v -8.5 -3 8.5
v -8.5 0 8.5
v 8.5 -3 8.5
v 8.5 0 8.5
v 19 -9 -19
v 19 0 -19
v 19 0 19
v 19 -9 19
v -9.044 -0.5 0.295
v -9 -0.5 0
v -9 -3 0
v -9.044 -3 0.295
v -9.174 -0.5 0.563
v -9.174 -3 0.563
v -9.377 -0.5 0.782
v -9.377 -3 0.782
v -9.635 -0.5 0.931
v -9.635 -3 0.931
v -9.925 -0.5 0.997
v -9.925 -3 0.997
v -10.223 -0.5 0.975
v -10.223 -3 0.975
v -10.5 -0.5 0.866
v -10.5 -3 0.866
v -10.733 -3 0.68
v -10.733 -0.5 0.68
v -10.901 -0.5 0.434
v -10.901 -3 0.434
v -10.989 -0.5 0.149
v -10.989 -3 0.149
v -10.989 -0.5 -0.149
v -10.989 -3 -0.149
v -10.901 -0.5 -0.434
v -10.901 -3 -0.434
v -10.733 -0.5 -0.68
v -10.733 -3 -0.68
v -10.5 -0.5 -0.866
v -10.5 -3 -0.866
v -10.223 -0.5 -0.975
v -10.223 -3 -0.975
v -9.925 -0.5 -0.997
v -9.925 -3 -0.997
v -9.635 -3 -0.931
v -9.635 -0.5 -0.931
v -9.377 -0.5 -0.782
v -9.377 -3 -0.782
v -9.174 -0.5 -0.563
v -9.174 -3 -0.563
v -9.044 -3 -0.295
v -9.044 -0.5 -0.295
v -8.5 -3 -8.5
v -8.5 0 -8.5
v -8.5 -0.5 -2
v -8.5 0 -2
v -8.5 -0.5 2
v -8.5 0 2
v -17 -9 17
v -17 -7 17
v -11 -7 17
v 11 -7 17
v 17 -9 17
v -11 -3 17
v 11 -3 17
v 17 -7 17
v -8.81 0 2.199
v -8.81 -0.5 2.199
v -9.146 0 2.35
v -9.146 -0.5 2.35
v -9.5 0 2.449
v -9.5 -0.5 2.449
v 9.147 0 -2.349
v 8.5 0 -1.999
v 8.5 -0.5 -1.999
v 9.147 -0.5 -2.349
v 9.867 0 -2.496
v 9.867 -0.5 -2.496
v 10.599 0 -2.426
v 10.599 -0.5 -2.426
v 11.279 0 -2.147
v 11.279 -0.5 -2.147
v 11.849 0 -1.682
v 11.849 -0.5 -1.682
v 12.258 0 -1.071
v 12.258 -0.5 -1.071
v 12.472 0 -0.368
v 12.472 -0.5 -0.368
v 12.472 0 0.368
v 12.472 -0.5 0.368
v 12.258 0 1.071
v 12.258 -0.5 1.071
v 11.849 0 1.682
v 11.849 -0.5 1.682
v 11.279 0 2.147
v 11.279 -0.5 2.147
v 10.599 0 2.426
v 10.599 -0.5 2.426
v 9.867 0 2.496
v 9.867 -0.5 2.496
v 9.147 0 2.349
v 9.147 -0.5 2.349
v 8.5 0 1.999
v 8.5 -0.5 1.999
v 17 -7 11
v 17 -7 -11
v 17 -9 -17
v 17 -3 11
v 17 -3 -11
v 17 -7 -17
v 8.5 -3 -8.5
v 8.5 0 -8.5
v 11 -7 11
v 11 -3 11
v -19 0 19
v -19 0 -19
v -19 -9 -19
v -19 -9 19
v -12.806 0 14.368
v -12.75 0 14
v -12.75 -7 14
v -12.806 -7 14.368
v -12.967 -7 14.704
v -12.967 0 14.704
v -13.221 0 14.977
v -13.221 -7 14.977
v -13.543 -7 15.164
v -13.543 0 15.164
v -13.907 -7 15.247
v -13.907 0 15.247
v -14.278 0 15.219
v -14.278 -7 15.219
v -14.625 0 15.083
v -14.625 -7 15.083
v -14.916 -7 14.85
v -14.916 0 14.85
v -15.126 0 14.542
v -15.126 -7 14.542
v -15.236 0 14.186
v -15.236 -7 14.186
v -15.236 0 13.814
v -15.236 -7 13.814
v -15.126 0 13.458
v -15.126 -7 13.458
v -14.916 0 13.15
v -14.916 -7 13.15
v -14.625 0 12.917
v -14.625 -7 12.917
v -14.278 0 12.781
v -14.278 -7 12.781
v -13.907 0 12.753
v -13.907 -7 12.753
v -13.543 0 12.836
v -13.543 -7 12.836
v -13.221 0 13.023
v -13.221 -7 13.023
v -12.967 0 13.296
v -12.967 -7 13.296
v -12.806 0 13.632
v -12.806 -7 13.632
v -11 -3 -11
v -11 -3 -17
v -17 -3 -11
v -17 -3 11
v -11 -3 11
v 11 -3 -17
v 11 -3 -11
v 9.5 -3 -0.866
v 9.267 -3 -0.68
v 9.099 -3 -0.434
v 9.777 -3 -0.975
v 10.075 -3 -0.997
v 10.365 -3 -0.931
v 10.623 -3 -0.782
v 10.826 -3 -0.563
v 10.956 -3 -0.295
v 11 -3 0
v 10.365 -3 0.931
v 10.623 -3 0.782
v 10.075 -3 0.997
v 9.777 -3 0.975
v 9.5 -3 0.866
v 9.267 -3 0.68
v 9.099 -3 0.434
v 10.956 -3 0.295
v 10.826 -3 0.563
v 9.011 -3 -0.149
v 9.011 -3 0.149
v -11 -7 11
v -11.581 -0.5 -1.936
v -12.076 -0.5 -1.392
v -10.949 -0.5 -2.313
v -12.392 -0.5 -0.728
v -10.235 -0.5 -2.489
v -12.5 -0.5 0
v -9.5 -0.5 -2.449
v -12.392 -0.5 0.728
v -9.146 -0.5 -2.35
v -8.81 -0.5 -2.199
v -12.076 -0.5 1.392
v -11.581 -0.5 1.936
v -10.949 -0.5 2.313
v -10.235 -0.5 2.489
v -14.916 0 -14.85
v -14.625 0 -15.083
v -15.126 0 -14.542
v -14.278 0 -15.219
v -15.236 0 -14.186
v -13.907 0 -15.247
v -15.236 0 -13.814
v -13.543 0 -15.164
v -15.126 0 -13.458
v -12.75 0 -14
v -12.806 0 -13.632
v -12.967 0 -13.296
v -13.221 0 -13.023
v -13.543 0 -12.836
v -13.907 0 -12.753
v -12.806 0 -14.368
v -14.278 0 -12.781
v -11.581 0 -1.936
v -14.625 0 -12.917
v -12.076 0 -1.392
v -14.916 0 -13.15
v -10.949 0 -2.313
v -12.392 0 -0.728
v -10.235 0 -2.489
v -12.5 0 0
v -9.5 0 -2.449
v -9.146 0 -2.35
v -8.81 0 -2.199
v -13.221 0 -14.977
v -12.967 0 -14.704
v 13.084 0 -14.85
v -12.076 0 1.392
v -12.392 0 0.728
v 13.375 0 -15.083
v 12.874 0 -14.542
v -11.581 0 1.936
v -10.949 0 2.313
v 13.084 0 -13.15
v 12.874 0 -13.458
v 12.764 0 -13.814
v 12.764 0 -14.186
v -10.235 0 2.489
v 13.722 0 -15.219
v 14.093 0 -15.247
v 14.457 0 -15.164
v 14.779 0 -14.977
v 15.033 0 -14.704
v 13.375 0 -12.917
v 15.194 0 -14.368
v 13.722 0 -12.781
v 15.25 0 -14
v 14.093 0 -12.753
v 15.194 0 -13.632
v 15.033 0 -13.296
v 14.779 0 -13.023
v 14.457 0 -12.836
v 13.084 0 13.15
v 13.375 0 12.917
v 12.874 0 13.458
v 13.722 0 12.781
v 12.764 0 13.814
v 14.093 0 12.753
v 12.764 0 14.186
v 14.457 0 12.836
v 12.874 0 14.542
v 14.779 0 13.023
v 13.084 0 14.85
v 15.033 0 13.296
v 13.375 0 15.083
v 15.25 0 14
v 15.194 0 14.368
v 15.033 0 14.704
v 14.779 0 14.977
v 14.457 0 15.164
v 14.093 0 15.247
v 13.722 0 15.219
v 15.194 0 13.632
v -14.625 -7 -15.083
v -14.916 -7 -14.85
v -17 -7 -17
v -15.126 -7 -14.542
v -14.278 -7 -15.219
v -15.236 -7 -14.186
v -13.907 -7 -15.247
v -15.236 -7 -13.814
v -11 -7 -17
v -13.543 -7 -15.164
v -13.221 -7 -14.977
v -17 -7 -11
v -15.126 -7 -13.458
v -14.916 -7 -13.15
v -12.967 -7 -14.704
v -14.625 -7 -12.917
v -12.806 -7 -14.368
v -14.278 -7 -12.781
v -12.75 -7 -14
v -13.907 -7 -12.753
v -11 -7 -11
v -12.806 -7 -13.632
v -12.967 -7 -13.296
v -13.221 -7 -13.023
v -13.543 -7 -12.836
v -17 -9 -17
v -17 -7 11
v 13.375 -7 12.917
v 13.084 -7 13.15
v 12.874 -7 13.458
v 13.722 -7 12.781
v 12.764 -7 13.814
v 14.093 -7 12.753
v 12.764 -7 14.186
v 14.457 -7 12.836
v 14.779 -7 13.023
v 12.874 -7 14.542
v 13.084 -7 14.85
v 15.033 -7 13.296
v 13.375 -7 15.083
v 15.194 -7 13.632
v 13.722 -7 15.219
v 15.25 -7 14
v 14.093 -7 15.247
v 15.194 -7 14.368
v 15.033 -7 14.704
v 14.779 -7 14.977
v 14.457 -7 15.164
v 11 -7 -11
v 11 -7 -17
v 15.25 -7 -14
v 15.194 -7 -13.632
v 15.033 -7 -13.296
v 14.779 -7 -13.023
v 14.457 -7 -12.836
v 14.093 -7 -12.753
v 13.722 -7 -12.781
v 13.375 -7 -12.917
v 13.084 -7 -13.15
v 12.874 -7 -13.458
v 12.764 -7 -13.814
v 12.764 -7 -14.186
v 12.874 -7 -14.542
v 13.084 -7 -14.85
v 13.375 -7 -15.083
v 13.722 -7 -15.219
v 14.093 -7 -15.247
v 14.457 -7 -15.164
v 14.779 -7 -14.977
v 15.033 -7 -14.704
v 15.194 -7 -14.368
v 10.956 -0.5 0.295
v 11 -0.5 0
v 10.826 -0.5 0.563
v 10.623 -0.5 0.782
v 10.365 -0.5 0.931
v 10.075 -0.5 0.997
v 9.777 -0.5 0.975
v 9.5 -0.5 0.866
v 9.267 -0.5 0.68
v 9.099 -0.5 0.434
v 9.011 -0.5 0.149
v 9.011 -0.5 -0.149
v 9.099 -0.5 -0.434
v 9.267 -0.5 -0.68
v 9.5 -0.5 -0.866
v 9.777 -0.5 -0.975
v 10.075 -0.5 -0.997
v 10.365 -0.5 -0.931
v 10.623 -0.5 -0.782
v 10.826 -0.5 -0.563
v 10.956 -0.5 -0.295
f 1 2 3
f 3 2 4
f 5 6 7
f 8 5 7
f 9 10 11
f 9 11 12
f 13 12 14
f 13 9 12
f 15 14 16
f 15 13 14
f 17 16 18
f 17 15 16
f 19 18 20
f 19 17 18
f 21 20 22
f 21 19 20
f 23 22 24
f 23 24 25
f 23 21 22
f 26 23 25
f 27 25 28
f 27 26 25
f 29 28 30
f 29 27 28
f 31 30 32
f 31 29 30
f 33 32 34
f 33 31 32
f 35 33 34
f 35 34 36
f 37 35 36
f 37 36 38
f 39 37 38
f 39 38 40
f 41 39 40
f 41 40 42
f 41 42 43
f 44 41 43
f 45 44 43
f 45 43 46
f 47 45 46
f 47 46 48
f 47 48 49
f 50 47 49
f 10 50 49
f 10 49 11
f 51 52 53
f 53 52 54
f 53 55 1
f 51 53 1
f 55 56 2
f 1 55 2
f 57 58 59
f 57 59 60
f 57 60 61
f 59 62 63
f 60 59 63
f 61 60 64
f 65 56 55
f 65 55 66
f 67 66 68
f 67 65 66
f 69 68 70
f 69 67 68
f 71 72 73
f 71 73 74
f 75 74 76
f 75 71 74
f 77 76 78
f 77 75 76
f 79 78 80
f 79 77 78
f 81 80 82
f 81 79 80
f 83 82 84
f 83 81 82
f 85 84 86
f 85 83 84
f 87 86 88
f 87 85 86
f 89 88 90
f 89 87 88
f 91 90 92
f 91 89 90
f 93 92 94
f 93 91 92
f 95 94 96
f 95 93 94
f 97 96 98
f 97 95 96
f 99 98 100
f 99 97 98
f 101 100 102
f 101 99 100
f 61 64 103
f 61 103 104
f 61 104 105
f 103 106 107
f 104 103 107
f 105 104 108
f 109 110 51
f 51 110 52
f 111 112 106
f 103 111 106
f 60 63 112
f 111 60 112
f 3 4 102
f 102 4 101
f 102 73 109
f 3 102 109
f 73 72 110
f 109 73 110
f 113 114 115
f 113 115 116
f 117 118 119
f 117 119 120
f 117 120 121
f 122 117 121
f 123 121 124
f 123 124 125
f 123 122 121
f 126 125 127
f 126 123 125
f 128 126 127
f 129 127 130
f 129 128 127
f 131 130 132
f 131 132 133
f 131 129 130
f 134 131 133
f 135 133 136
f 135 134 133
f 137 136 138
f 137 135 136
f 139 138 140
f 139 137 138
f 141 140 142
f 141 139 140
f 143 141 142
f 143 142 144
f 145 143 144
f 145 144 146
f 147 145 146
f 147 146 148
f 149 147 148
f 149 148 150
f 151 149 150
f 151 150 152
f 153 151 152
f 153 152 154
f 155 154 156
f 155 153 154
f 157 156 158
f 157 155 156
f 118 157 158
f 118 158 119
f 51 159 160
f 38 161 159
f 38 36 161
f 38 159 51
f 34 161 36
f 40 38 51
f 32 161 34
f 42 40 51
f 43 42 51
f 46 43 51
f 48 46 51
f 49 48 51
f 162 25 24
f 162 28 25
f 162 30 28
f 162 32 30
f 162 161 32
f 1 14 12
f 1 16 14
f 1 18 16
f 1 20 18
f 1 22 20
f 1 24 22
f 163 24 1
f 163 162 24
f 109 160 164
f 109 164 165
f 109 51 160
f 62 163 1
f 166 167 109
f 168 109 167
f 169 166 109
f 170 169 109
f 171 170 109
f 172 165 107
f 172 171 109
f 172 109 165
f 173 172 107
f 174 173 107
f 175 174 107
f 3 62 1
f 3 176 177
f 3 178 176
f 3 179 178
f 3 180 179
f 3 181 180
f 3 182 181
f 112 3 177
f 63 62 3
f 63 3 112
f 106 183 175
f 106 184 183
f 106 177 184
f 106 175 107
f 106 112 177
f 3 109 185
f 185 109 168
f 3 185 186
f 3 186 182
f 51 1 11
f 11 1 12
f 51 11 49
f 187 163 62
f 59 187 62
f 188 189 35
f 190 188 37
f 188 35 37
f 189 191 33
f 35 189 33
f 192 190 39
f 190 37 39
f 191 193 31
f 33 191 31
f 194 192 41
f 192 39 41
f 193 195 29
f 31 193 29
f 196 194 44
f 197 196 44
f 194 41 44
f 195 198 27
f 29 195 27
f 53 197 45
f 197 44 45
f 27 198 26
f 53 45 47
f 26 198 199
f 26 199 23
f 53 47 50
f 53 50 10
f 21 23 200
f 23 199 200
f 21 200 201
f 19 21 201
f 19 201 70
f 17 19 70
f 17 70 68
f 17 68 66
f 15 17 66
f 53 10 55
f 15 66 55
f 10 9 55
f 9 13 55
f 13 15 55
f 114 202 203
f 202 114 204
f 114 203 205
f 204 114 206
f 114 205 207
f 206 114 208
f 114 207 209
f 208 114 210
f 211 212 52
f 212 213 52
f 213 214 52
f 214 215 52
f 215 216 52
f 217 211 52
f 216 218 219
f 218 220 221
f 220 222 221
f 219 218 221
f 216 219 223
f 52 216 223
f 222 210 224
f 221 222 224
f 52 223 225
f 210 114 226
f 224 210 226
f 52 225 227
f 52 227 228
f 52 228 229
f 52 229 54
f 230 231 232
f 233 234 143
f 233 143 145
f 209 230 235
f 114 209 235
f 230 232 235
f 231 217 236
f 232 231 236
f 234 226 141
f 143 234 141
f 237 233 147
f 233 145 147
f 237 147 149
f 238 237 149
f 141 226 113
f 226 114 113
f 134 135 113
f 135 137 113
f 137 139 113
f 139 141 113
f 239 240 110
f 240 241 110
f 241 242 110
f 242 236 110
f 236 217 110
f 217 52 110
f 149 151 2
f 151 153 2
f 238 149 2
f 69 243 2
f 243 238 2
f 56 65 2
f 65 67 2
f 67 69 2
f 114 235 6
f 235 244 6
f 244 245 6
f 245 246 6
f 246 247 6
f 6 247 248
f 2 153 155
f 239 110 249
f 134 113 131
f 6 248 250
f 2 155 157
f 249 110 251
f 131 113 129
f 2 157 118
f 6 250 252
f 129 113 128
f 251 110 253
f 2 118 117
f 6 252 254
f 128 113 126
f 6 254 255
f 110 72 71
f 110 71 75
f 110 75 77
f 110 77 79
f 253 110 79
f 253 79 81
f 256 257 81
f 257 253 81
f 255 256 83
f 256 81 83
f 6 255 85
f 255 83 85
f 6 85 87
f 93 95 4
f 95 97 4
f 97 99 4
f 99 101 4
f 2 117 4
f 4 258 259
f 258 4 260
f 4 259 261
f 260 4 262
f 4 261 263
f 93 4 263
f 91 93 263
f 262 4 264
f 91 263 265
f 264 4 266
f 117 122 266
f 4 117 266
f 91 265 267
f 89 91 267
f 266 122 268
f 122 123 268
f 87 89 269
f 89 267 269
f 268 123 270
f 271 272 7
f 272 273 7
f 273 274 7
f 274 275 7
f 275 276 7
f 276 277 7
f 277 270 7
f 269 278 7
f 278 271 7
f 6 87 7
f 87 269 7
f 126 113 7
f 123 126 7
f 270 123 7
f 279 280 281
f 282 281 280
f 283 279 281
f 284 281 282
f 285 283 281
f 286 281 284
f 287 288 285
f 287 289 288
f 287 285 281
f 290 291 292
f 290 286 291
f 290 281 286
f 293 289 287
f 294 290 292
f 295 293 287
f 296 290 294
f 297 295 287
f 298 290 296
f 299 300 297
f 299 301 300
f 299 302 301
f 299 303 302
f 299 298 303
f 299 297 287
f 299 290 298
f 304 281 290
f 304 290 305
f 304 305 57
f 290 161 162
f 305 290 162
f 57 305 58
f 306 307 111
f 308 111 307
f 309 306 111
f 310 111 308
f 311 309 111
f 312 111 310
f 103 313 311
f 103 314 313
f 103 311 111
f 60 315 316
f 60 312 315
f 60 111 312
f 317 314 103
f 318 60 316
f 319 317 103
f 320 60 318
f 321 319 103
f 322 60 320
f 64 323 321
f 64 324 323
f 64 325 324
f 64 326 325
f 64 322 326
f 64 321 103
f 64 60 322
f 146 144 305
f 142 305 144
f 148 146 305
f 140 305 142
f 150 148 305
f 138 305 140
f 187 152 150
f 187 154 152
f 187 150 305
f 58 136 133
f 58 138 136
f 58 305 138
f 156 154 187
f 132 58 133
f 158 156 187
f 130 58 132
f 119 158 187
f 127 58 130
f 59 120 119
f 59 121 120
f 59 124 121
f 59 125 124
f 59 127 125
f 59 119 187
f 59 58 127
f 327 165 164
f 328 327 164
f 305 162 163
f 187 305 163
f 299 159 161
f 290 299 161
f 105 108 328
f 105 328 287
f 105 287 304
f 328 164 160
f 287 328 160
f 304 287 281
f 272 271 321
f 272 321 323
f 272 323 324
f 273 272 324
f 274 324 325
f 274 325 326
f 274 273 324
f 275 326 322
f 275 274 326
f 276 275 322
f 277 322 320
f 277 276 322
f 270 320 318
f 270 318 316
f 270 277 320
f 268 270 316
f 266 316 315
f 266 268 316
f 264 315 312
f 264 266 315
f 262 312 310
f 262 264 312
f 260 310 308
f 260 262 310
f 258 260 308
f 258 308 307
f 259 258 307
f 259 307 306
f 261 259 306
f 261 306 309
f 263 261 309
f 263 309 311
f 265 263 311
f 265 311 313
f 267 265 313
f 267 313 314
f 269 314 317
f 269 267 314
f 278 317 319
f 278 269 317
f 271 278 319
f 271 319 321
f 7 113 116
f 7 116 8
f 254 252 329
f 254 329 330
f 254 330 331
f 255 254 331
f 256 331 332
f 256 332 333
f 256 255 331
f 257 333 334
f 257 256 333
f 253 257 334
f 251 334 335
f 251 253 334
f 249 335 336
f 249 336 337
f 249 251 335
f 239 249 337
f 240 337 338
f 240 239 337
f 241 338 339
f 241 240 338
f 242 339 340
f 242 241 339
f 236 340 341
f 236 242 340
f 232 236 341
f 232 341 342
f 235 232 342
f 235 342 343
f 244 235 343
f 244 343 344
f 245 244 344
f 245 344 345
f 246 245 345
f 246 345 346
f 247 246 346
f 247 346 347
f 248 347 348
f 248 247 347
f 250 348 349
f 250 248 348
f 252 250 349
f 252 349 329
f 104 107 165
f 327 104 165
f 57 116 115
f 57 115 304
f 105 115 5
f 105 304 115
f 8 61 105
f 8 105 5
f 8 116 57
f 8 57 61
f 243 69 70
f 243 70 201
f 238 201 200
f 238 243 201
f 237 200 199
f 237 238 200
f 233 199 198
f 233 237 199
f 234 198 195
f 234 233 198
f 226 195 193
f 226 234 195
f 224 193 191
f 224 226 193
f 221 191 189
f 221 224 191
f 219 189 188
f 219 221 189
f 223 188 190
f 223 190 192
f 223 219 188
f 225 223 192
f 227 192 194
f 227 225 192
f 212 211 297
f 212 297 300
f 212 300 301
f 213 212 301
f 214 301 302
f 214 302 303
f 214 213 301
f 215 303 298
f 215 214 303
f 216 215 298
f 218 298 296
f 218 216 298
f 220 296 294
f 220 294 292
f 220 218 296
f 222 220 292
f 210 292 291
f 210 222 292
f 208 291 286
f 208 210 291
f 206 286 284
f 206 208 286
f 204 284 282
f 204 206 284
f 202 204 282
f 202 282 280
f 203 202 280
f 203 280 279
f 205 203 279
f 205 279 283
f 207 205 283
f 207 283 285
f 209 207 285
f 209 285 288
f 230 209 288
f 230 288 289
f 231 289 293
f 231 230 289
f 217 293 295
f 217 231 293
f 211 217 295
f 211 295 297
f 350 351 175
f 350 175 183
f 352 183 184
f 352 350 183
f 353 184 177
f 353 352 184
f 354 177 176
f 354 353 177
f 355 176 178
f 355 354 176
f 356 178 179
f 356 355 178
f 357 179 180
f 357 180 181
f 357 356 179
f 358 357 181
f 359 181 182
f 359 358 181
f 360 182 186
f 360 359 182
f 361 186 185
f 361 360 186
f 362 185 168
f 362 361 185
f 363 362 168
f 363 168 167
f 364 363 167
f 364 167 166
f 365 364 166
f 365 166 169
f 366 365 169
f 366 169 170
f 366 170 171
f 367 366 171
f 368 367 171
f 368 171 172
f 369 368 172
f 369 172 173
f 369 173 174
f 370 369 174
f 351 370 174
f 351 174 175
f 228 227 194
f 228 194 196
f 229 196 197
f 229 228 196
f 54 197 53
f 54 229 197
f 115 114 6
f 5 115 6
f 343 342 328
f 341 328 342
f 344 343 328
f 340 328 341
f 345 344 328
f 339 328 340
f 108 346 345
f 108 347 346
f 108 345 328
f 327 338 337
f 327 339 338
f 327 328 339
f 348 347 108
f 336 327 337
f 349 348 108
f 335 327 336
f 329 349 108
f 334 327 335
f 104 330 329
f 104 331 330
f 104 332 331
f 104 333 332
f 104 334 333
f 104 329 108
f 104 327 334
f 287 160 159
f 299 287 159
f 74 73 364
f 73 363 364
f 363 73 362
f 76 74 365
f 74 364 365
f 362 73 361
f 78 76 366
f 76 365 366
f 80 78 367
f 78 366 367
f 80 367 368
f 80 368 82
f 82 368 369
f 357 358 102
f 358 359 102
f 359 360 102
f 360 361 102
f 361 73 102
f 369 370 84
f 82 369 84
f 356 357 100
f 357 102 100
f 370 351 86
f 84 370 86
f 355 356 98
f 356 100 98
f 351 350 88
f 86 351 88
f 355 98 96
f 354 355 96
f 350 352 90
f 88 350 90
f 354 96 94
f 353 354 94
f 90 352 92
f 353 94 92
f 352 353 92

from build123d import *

# Parameters (mm, degrees)
F0_R     = 1.25
F1_DEPTH = 7
F0_R_2   = 1
F2_DEPTH = 3
F3_DEPTH = 3
F4_DEPTH = 7
F0_W     = 6
F0_H     = 6
F0_W_2   = 22
F0_H_2   = 1
F5_DEPTH = 3
F0_W_3   = 38
F0_H_3   = 38
F6_DEPTH = 9
F7_DEPTH = 0.5
F8_DEPTH = 0.5


with BuildPart() as f1:
    # F0 (on Front) → F1 (new body)
    with BuildSketch(Plane.XZ):
        with BuildLine():
            ThreePointArc((-11.5, 14), (-11.7639320225, 15.1180339887), (-12.5, 16))
            ThreePointArc((-12.5, 16), (-15.767766953, 15.767766953), (-16, 12.5))
            ThreePointArc((-16, 12.5), (-13.209430585, 11.6282917549), (-11.5, 14))
        make_face()
        with Locations((-14, 14)):
            Circle(F0_R, mode=Mode.SUBTRACT)
    extrude(amount=F1_DEPTH)

    # F0 (on Front) → F4 (join)
    with BuildSketch(Plane.XZ):
        with BuildLine():
            Line((-11, 11), (-11, 16))
            Line((-11, 16), (-12.5, 16))
            ThreePointArc((-12.5, 16), (-11.7639320225, 15.1180339887), (-11.5, 14))
            ThreePointArc((-11.5, 14), (-13.209430585, 11.6282917549), (-16, 12.5))
            Line((-16, 12.5), (-16, 11))
            Line((-16, 11), (-11, 11))
        make_face()
        with BuildLine():
            Line((-11, 16), (-11, 17))
            Line((-11, 17), (-17, 17))
            Line((-17, 17), (-17, 11))
            Line((-17, 11), (-16, 11))
            Line((-16, 11), (-16, 12.5))
            ThreePointArc((-16, 12.5), (-15.767766953, 15.767766953), (-12.5, 16))
            Line((-12.5, 16), (-11, 16))
        make_face()
    extrude(amount=F4_DEPTH)



with BuildPart() as f1b:
    # F0 (on Front) → F1, piece 2 (new body)
    with BuildSketch(Plane.XZ):
        with BuildLine():
            ThreePointArc((12.5, 16), (12.232233047, 12.232233047), (16, 12.5))
            ThreePointArc((16, 12.5), (16.3717082451, 13.209430585), (16.5, 14))
            ThreePointArc((16.5, 14), (15.1180339887, 16.2360679775), (12.5, 16))
        make_face()
        with Locations((14, 14)):
            Circle(F0_R, mode=Mode.SUBTRACT)
    extrude(amount=F1_DEPTH)

    # F0 (on Front) → F4, piece 2 (join)
    with BuildSketch(Plane.XZ):
        with BuildLine():
            ThreePointArc((16.5, 14), (16.3717082451, 13.209430585), (16, 12.5))
            Line((16, 12.5), (16, 11))
            Line((16, 11), (17, 11))
            Line((17, 11), (17, 17))
            Line((17, 17), (11, 17))
            Line((11, 17), (11, 16))
            Line((11, 16), (12.5, 16))
            ThreePointArc((12.5, 16), (15.1180339887, 16.2360679775), (16.5, 14))
        make_face()
        with BuildLine():
            Line((16, 11), (16, 12.5))
            ThreePointArc((16, 12.5), (12.232233047, 12.232233047), (12.5, 16))
            Line((12.5, 16), (11, 16))
            Line((11, 16), (11, 11))
            Line((11, 11), (16, 11))
        make_face()
    extrude(amount=F4_DEPTH)


with BuildPart() as f1c:
    # F0 (on Front) → F1, piece 3 (new body)
    with BuildSketch(Plane.XZ):
        with BuildLine():
            ThreePointArc((-16, -12.5), (-15.767766953, -15.767766953), (-12.5, -16))
            ThreePointArc((-12.5, -16), (-11.7639320225, -15.1180339887), (-11.5, -14))
            ThreePointArc((-11.5, -14), (-13.209430585, -11.6282917549), (-16, -12.5))
        make_face()
        with Locations((-14, -14)):
            Circle(F0_R, mode=Mode.SUBTRACT)
    extrude(amount=F1_DEPTH)

    # F0 (on Front) → F4, piece 4 (join)
    with BuildSketch(Plane.XZ):
        with BuildLine():
            Line((-12.5, -16), (-11, -16))
            Line((-11, -16), (-11, -11))
            Line((-11, -11), (-16, -11))
            Line((-16, -11), (-16, -12.5))
            ThreePointArc((-16, -12.5), (-13.209430585, -11.6282917549), (-11.5, -14))
            ThreePointArc((-11.5, -14), (-11.7639320225, -15.1180339887), (-12.5, -16))
        make_face()
        with BuildLine():
            Line((-11, -17), (-11, -16))
            Line((-11, -16), (-12.5, -16))
            ThreePointArc((-12.5, -16), (-15.767766953, -15.767766953), (-16, -12.5))
            Line((-16, -12.5), (-16, -11))
            Line((-16, -11), (-17, -11))
            Line((-17, -11), (-17, -17))
            Line((-17, -17), (-11, -17))
        make_face()
    extrude(amount=F4_DEPTH)


with BuildPart() as f1d:
    # F0 (on Front) → F1, piece 4 (new body)
    with BuildSketch(Plane.XZ):
        with BuildLine():
            ThreePointArc((16.5, -14), (16.3717082451, -13.209430585), (16, -12.5))
            ThreePointArc((16, -12.5), (12.232233047, -12.232233047), (12.5, -16))
            ThreePointArc((12.5, -16), (15.1180339887, -16.2360679775), (16.5, -14))
        make_face()
        with Locations((14, -14)):
            Circle(F0_R, mode=Mode.SUBTRACT)
    extrude(amount=F1_DEPTH)

    # F0 (on Front) → F4, piece 3 (join)
    with BuildSketch(Plane.XZ):
        with BuildLine():
            Line((17, -11), (16, -11))
            Line((16, -11), (16, -12.5))
            ThreePointArc((16, -12.5), (16.3717082451, -13.209430585), (16.5, -14))
            ThreePointArc((16.5, -14), (15.1180339887, -16.2360679775), (12.5, -16))
            Line((12.5, -16), (11, -16))
            Line((11, -16), (11, -17))
            Line((11, -17), (17, -17))
            Line((17, -17), (17, -11))
        make_face()
        with BuildLine():
            Line((16, -12.5), (16, -11))
            Line((16, -11), (11, -11))
            Line((11, -11), (11, -16))
            Line((11, -16), (12.5, -16))
            ThreePointArc((12.5, -16), (12.232233047, -12.232233047), (16, -12.5))
        make_face()
    extrude(amount=F4_DEPTH)


with BuildPart() as f2:
    # F0 (on Front) → F2 (new body)
    with BuildSketch(Plane.XZ):
        with BuildLine():
            Line((-8.5, -2), (-8.5, 3.6e-09))
            Line((-8.5, 3.6e-09), (-8.5, 2))
            ThreePointArc((-8.5, 2), (-8.9750559736, 2.2802389662), (-9.5, 2.4494897428))
            ThreePointArc((-9.5, 2.4494897428), (-12.5, 0), (-9.5, -2.4494897428))
            ThreePointArc((-9.5, -2.4494897428), (-8.9750559736, -2.2802389662), (-8.5, -2))
        make_face()
        with Locations((-10, 0)):
            Circle(F0_R_2, mode=Mode.SUBTRACT)
    extrude(amount=F2_DEPTH)



with BuildPart() as f2b:
    # F0 (on Front) → F2, piece 2 (new body)
    with BuildSketch(Plane.XZ):
        with BuildLine():
            ThreePointArc((8.5, -1.9991173555), (12.4992939405, 0), (8.5, 1.9991173555))
            Line((8.5, 1.9991173555), (8.5, 0))
            Line((8.5, 0), (8.5, -1.9991173555))
        make_face()
        with Locations((10, 0)):
            Circle(F0_R_2, mode=Mode.SUBTRACT)
    extrude(amount=F2_DEPTH)


with BuildPart() as f2_1:
    add(f2.part)

    add(f2b.part)  # F3 merges F2b
    # F0 (on Front) → F3 (join)
    with BuildSketch(Plane.XZ):
        with BuildLine():
            Line((0, 8.5), (8.5, 8.5))
            Line((8.5, 8.5), (8.5, 1.9991173555))
            ThreePointArc((8.5, 1.9991173555), (12.4992939405, 0), (8.5, -1.9991173555))
            Line((8.5, -1.9991173555), (8.5, -8.5))
            Line((8.5, -8.5), (0, -8.5))
            Line((0, -8.5), (-8.5, -8.5))
            Line((-8.5, -8.5), (-8.5, -2))
            ThreePointArc((-8.5, -2), (-8.9750559736, -2.2802389662), (-9.5, -2.4494897428))
            Line((-9.5, -2.4494897428), (-9.5, -9.5))
            Line((-9.5, -9.5), (9.5, -9.5))
            Line((9.5, -9.5), (9.5, -2.4494897428))
            ThreePointArc((9.5, -2.4494897428), (12.5, 0), (9.5, 2.4494897428))
            Line((9.5, 2.4494897428), (9.5, 9.5))
            Line((9.5, 9.5), (-9.5, 9.5))
            Line((-9.5, 9.5), (-9.5, 2.4494897428))
            ThreePointArc((-9.5, 2.4494897428), (-8.9750559736, 2.2802389662), (-8.5, 2))
            Line((-8.5, 2), (-8.5, 8.5))
            Line((-8.5, 8.5), (0, 8.5))
        make_face()
    extrude(amount=F3_DEPTH)


with BuildPart() as f1_1:
    add(f1.part)

    add(f1b.part)  # F5 merges F1b

    add(f1c.part)  # F5 merges F1c

    add(f1d.part)  # F5 merges F1d

    add(f2_1.part)  # F5 merges F2
    # F0 (on Front) → F5 (join)
    with BuildSketch(Plane.XZ):
        Polygon((10, 16), (11, 16), (11, 17), (-11, 17), (-11, 16), (-10, 16), (0, 16), align=None)
        Polygon((16, 10.2088758318), (16, 11), (11, 11), (11, 16), (10, 16), (10, 10.2023985237), (10, 10), (0, 10), (0, 16), (-10, 16), (-11, 16), (-11, 11), (-16, 11), (-16, 10), (-10, 10), (-10, 4), (-16, 4), (-16, -11), (-11, -11), (-11, -16), (11, -16), (11, -11), (16, -11), align=None)
        with BuildLine():
            ThreePointArc((-9.5, -2.4494897428), (-12.5, 0), (-9.5, 2.4494897428))
            Line((-9.5, 2.4494897428), (-9.5, 9.5))
            Line((-9.5, 9.5), (9.5, 9.5))
            Line((9.5, 9.5), (9.5, 2.4494897428))
            ThreePointArc((9.5, 2.4494897428), (12.5, 0), (9.5, -2.4494897428))
            Line((9.5, -2.4494897428), (9.5, -9.5))
            Line((9.5, -9.5), (-9.5, -9.5))
            Line((-9.5, -9.5), (-9.5, -2.4494897428))
        make_face(mode=Mode.SUBTRACT)
        Polygon((10, 10.2023985237), (10, 16), (0, 16), (0, 10), (10, 10), align=None)
        with Locations((-13, 7)):
            Rectangle(F0_W, F0_H)
        Polygon((-16, 11), (-17, 11), (-17, -11), (-16, -11), (-16, 4), (-16, 10), align=None)
        with Locations((0, -16.5)):
            Rectangle(F0_W_2, F0_H_2)
        Polygon((17, 11), (16, 11), (16, 10.2088758318), (16, -11), (17, -11), align=None)
    extrude(amount=F5_DEPTH)

    # F0 (on Front) → F6 (join)
    with BuildSketch(Plane.XZ):
        Rectangle(F0_W_3, F0_H_3)
        Polygon((17, 17), (17, 11), (17, -11), (17, -17), (11, -17), (-11, -17), (-17, -17), (-17, -11), (-17, 11), (-17, 17), (-11, 17), (11, 17), align=None, mode=Mode.SUBTRACT)
    extrude(amount=F6_DEPTH)

    # F0 (on Front) → F7 (cut)
    with BuildSketch(Plane.XZ):
        with BuildLine():
            Line((-8.5, -2), (-8.5, 3.6e-09))
            Line((-8.5, 3.6e-09), (-8.5, 2))
            ThreePointArc((-8.5, 2), (-8.9750559736, 2.2802389662), (-9.5, 2.4494897428))
            ThreePointArc((-9.5, 2.4494897428), (-12.5, 0), (-9.5, -2.4494897428))
            ThreePointArc((-9.5, -2.4494897428), (-8.9750559736, -2.2802389662), (-8.5, -2))
        make_face()
        with Locations((-10, 0)):
            Circle(F0_R_2, mode=Mode.SUBTRACT)
    extrude(amount=F7_DEPTH, mode=Mode.SUBTRACT)

    # F0 (on Front) → F8 (cut)
    with BuildSketch(Plane.XZ):
        with BuildLine():
            ThreePointArc((8.5, -1.9991173555), (12.4992939405, 0), (8.5, 1.9991173555))
            Line((8.5, 1.9991173555), (8.5, 0))
            Line((8.5, 0), (8.5, -1.9991173555))
        make_face()
        with Locations((10, 0)):
            Circle(F0_R_2, mode=Mode.SUBTRACT)
    extrude(amount=F8_DEPTH, mode=Mode.SUBTRACT)


solid = f1_1.part
